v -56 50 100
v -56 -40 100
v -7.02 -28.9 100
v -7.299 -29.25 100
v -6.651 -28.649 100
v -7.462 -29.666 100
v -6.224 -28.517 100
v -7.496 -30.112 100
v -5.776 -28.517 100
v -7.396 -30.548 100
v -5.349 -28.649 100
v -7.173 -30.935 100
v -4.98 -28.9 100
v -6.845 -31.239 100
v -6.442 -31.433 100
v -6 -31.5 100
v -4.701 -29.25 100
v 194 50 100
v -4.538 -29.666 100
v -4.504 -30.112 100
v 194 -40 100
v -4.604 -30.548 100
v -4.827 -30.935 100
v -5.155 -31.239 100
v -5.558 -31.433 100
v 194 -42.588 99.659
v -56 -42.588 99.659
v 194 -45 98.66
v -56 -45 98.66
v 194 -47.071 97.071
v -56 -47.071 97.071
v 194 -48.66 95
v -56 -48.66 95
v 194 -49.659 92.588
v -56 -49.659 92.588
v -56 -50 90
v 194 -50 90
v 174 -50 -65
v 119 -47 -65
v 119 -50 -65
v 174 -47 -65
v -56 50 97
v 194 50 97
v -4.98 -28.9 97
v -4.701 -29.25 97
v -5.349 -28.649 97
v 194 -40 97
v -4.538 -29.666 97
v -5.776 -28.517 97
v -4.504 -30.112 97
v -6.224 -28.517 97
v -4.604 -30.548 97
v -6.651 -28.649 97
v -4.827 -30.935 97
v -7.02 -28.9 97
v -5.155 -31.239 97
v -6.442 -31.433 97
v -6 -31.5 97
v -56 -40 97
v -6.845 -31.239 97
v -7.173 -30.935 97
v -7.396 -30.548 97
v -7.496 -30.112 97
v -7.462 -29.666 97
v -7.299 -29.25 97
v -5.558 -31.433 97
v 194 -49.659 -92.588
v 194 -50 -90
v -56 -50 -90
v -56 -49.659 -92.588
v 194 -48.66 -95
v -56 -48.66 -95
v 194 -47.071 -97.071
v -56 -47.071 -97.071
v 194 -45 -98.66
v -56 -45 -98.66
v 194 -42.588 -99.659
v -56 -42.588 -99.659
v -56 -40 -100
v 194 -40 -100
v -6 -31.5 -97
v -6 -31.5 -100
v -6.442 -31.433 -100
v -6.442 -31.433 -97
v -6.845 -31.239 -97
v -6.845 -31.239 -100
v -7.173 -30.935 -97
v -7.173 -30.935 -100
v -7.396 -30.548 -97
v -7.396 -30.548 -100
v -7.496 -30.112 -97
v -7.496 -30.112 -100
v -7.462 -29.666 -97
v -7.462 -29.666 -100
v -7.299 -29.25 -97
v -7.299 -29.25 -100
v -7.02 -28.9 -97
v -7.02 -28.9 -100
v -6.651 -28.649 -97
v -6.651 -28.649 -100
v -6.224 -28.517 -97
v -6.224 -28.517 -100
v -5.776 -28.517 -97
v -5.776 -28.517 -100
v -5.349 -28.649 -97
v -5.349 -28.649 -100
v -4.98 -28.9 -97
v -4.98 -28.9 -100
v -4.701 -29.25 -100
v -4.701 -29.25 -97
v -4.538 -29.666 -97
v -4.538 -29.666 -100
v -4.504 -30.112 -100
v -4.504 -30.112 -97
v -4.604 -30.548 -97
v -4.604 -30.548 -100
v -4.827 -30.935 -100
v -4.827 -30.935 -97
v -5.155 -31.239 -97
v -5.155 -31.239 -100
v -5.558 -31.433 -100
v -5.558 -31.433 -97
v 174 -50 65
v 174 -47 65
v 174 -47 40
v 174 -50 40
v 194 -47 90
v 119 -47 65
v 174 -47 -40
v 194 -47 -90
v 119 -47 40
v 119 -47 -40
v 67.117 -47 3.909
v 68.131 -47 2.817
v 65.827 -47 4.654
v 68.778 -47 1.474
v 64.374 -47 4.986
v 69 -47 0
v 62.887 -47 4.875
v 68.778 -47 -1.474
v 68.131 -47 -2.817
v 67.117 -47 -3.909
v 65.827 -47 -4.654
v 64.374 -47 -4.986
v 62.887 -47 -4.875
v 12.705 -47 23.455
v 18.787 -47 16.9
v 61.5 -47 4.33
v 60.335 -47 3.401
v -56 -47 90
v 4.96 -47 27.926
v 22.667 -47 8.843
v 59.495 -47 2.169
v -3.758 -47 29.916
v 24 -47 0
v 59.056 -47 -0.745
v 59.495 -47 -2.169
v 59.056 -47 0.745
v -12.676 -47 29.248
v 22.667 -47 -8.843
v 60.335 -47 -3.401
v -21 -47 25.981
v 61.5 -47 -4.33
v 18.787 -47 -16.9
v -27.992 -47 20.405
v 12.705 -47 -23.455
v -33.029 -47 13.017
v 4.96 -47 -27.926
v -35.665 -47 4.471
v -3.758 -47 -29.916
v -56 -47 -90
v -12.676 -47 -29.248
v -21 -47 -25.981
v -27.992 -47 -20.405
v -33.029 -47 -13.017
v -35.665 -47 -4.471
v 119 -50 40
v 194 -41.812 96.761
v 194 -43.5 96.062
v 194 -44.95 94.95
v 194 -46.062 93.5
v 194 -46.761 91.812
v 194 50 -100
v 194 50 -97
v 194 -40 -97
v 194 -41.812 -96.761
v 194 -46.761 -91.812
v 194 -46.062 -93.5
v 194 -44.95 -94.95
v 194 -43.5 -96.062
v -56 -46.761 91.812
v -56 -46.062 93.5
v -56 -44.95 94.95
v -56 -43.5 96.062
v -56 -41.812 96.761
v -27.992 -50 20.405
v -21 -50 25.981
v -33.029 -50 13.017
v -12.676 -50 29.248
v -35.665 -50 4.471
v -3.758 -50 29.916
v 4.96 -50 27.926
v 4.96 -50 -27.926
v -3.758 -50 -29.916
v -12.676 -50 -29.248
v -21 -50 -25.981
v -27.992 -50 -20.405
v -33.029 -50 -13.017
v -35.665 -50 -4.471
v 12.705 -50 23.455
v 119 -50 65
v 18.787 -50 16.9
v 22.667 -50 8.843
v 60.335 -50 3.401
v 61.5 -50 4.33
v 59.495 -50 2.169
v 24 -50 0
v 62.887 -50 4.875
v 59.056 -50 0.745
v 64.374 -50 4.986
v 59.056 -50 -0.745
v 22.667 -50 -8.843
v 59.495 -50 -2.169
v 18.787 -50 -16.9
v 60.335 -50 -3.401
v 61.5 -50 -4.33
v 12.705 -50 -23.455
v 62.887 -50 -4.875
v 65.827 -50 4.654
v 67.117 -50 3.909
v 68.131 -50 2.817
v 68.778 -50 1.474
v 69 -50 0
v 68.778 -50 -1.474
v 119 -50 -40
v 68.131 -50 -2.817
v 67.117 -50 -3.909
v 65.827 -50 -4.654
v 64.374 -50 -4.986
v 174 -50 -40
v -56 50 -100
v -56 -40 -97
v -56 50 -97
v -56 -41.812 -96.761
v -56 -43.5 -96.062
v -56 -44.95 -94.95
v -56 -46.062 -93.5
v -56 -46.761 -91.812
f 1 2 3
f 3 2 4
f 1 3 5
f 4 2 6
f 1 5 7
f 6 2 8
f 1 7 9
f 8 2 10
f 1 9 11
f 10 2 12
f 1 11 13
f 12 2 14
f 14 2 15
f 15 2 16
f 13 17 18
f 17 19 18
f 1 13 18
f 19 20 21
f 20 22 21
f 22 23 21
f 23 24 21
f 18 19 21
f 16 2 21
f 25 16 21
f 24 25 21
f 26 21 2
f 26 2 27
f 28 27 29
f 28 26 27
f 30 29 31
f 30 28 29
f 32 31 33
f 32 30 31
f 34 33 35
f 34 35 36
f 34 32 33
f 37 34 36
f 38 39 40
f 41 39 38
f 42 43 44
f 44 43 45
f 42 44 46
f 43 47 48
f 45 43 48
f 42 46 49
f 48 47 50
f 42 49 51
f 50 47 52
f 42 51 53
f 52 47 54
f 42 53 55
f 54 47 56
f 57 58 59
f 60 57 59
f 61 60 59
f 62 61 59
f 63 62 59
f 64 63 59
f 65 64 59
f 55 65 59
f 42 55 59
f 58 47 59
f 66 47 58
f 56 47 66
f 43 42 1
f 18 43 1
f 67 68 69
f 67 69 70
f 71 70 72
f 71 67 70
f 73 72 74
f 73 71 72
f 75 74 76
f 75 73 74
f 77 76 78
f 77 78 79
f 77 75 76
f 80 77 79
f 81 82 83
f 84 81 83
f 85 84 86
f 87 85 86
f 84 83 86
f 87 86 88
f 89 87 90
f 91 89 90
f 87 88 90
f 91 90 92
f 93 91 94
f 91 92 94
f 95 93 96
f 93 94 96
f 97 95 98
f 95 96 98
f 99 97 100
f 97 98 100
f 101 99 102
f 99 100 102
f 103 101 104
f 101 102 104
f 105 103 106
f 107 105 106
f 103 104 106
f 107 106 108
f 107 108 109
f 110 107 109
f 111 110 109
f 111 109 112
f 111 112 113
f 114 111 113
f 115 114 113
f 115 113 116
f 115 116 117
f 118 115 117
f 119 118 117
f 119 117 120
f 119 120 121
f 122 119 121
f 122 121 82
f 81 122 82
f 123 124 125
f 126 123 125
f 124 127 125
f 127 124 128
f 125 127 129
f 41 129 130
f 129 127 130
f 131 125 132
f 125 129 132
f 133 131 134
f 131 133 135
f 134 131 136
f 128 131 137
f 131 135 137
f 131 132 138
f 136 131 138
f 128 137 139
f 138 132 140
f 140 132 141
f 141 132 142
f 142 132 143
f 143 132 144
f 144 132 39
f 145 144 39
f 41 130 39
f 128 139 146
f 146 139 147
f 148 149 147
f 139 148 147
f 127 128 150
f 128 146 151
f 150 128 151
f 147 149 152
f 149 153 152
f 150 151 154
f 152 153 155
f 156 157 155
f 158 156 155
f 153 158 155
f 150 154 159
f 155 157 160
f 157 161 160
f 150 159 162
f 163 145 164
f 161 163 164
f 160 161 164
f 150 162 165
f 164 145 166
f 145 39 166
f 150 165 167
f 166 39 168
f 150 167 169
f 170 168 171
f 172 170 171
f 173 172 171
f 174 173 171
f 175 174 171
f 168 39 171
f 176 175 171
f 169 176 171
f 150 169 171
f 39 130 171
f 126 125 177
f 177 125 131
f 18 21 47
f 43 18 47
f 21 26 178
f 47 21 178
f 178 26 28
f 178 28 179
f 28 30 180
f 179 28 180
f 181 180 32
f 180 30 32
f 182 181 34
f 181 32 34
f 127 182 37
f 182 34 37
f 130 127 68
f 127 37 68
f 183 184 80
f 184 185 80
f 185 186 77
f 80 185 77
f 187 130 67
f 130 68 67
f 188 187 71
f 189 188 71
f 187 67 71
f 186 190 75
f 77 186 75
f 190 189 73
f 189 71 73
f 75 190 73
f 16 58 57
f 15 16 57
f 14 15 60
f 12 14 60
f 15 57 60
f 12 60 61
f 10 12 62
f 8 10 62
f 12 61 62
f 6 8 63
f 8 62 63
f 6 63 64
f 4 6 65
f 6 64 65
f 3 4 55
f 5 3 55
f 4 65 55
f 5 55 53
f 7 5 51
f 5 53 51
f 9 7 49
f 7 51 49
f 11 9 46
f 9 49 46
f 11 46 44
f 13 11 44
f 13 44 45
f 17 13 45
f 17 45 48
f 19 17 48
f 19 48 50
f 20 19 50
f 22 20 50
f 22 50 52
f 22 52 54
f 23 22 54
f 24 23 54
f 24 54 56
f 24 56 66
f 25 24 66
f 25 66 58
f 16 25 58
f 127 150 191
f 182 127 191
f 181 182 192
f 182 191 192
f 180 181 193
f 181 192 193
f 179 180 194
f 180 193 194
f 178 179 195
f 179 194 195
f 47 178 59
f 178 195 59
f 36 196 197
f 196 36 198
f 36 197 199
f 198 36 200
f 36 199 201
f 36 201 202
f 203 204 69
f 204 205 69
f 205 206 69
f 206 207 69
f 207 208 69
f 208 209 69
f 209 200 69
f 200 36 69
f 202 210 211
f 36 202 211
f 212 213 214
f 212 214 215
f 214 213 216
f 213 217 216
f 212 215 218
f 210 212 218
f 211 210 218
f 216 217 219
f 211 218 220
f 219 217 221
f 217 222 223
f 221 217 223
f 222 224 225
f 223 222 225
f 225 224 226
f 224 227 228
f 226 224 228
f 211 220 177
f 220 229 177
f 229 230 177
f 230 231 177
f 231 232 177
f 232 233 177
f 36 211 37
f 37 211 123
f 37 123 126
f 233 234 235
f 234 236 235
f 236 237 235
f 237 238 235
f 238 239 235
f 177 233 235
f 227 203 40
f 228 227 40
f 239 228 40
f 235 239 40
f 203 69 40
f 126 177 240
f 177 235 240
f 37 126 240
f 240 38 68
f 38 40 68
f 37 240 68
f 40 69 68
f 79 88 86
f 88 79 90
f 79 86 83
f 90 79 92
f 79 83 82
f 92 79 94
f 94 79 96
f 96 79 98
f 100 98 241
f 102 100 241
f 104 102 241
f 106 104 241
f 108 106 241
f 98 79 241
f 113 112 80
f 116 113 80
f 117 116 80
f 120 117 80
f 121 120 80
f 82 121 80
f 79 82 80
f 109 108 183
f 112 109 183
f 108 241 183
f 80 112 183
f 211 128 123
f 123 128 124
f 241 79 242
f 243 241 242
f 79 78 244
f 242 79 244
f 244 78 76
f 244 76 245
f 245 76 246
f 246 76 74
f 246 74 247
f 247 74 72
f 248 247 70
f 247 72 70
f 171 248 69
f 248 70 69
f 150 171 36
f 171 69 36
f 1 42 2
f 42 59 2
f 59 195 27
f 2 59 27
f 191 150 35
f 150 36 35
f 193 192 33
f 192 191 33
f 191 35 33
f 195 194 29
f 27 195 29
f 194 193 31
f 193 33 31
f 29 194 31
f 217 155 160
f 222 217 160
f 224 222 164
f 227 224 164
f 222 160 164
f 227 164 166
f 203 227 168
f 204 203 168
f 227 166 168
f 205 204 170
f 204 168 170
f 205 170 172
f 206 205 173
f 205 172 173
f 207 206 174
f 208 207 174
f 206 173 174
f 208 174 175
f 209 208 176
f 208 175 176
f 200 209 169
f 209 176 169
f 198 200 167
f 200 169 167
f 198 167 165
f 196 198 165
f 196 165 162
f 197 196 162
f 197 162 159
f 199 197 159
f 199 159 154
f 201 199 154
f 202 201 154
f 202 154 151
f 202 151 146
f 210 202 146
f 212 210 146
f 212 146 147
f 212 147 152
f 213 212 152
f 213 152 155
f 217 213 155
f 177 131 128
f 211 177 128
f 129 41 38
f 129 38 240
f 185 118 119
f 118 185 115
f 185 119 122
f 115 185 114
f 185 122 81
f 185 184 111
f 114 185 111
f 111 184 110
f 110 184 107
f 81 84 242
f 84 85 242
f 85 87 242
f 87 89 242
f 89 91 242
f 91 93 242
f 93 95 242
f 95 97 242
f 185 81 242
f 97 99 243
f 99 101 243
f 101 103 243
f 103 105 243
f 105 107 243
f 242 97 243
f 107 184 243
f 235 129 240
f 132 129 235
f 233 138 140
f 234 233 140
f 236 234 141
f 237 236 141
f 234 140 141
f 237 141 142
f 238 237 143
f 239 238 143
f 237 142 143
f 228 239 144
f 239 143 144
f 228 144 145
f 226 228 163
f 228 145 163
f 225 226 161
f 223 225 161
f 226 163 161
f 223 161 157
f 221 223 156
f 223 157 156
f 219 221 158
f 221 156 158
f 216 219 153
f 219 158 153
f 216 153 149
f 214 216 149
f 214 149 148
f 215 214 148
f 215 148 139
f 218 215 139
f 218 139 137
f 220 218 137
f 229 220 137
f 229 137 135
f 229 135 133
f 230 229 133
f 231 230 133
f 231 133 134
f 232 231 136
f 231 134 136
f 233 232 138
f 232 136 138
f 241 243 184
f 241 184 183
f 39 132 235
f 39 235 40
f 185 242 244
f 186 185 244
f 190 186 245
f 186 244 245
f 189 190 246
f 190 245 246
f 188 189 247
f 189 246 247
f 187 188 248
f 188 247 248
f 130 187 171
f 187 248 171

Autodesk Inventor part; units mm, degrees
ref_plane "YZ Plane" through (0, 0, 0) normal (1, 0, 0) x (0, 1, 0)
ref_plane "XY Plane" through (0, 0, 0) normal (0, 0, 1) x (1, 0, 0)
sketch "Sketch1" plane through (0, 0, 0) normal (1, 0, 0) x (0, 1, 0)
  line L0 (50, -100) -> (-50, -100) construction
  line L1 (-50, -100) -> (-50, 100) construction
  line L2 (-50, 100) -> (50, 100) construction
  line L3 (50, 100) -> (50, -100) construction
  line L4 (50, -100) -> (-50, 100) construction
  line L5 (-50, -100) -> (50, 100) construction
  line L6 (50, 100) -> (-40, 100)
  arc A0 (-40, 100) -> (-50, 90) centre (-40, 90) ccw
  line L7 (50, -100) -> (-40, -100)
  arc A1 (-50, -90) -> (-40, -100) centre (-40, -90) ccw
  line L8 (-50, -90) -> (-50, 90)
  point P0 (0, 0)
  dimension "d0" = 100
  dimension "d1" = 200
  dimension "d2" = 90
  dimension "d3" = 90
ref_plane "Work Plane1" through (0, 50, 100) normal (0, 1, 0) x (-1, 0, 0)
sketch "Sketch2" plane through (0, 50, 100) normal (0, 1, 0) x (-1, 0, 0)
  line L0 (56, 0) -> (-194, 0)
  line L1 (-194, 0) -> (-194, -3)
  line L2 (-194, -3) -> (56, -3)
  line L3 (56, -3) -> (56, 0)
  point P0 (0, -100)
  dimension "d4" = 250
  dimension "d5" = 3
sweep "Sweep1" add profiles "Sketch2" path "Sketch1"
sketch "Sketch3" plane through (-56, -47, 90) normal (0, 1, 0) x (1, 0, 0)
  circle A0 centre (50, 90) radius 30
  line L0 (175, 25) -> (230, 25)
  line L1 (230, 25) -> (230, 50)
  line L2 (230, 50) -> (175, 50)
  line L3 (175, 50) -> (175, 25)
  line L4 (250, 0) -> (250, 180) projected
  line L5 (0, 0) -> (250, 0) projected
  line L6 (56, 90) -> (50, 90) construction
  line L7 (50, 90) -> (250, 90) construction
  line L8 (175, 155) -> (230, 155)
  line L9 (230, 155) -> (230, 130)
  line L10 (230, 130) -> (175, 130)
  line L11 (175, 130) -> (175, 155)
  line L12 (0, 0) -> (0, 180) projected
  circle A1 centre (120, 90) radius 5
  dimension "d8" = 60
  dimension "d10" = 55
  dimension "d11" = 25
  dimension "d12" = 20
  dimension "d13" = 25
  dimension "d25" = 50
  dimension "d26" = 10
  dimension "d27" = 120
extrude "Extrusion1" cut sketch "Sketch3" against normal through all
sketch "Sketch4" plane through (-56, 50, 100) normal (0, 0, 1) x (1, 0, 0)
  line L0 (0, 0) -> (0, -90) projected
  line L1 (250, -90) -> (0, -90) projected
  point P0 (56, -50)
  point P1 (50, -80)
  dimension "d16" = 50
  dimension "d17" = 10
hole "Hole1" at (-6, -30, 100) direction (0, 0, -1) diameter 3 end through all
equation "\"d3\" = d2"
equation "\"d16\" = d9"
equation "\"d9\" = 50"
properties material "PMMA Plastic"
